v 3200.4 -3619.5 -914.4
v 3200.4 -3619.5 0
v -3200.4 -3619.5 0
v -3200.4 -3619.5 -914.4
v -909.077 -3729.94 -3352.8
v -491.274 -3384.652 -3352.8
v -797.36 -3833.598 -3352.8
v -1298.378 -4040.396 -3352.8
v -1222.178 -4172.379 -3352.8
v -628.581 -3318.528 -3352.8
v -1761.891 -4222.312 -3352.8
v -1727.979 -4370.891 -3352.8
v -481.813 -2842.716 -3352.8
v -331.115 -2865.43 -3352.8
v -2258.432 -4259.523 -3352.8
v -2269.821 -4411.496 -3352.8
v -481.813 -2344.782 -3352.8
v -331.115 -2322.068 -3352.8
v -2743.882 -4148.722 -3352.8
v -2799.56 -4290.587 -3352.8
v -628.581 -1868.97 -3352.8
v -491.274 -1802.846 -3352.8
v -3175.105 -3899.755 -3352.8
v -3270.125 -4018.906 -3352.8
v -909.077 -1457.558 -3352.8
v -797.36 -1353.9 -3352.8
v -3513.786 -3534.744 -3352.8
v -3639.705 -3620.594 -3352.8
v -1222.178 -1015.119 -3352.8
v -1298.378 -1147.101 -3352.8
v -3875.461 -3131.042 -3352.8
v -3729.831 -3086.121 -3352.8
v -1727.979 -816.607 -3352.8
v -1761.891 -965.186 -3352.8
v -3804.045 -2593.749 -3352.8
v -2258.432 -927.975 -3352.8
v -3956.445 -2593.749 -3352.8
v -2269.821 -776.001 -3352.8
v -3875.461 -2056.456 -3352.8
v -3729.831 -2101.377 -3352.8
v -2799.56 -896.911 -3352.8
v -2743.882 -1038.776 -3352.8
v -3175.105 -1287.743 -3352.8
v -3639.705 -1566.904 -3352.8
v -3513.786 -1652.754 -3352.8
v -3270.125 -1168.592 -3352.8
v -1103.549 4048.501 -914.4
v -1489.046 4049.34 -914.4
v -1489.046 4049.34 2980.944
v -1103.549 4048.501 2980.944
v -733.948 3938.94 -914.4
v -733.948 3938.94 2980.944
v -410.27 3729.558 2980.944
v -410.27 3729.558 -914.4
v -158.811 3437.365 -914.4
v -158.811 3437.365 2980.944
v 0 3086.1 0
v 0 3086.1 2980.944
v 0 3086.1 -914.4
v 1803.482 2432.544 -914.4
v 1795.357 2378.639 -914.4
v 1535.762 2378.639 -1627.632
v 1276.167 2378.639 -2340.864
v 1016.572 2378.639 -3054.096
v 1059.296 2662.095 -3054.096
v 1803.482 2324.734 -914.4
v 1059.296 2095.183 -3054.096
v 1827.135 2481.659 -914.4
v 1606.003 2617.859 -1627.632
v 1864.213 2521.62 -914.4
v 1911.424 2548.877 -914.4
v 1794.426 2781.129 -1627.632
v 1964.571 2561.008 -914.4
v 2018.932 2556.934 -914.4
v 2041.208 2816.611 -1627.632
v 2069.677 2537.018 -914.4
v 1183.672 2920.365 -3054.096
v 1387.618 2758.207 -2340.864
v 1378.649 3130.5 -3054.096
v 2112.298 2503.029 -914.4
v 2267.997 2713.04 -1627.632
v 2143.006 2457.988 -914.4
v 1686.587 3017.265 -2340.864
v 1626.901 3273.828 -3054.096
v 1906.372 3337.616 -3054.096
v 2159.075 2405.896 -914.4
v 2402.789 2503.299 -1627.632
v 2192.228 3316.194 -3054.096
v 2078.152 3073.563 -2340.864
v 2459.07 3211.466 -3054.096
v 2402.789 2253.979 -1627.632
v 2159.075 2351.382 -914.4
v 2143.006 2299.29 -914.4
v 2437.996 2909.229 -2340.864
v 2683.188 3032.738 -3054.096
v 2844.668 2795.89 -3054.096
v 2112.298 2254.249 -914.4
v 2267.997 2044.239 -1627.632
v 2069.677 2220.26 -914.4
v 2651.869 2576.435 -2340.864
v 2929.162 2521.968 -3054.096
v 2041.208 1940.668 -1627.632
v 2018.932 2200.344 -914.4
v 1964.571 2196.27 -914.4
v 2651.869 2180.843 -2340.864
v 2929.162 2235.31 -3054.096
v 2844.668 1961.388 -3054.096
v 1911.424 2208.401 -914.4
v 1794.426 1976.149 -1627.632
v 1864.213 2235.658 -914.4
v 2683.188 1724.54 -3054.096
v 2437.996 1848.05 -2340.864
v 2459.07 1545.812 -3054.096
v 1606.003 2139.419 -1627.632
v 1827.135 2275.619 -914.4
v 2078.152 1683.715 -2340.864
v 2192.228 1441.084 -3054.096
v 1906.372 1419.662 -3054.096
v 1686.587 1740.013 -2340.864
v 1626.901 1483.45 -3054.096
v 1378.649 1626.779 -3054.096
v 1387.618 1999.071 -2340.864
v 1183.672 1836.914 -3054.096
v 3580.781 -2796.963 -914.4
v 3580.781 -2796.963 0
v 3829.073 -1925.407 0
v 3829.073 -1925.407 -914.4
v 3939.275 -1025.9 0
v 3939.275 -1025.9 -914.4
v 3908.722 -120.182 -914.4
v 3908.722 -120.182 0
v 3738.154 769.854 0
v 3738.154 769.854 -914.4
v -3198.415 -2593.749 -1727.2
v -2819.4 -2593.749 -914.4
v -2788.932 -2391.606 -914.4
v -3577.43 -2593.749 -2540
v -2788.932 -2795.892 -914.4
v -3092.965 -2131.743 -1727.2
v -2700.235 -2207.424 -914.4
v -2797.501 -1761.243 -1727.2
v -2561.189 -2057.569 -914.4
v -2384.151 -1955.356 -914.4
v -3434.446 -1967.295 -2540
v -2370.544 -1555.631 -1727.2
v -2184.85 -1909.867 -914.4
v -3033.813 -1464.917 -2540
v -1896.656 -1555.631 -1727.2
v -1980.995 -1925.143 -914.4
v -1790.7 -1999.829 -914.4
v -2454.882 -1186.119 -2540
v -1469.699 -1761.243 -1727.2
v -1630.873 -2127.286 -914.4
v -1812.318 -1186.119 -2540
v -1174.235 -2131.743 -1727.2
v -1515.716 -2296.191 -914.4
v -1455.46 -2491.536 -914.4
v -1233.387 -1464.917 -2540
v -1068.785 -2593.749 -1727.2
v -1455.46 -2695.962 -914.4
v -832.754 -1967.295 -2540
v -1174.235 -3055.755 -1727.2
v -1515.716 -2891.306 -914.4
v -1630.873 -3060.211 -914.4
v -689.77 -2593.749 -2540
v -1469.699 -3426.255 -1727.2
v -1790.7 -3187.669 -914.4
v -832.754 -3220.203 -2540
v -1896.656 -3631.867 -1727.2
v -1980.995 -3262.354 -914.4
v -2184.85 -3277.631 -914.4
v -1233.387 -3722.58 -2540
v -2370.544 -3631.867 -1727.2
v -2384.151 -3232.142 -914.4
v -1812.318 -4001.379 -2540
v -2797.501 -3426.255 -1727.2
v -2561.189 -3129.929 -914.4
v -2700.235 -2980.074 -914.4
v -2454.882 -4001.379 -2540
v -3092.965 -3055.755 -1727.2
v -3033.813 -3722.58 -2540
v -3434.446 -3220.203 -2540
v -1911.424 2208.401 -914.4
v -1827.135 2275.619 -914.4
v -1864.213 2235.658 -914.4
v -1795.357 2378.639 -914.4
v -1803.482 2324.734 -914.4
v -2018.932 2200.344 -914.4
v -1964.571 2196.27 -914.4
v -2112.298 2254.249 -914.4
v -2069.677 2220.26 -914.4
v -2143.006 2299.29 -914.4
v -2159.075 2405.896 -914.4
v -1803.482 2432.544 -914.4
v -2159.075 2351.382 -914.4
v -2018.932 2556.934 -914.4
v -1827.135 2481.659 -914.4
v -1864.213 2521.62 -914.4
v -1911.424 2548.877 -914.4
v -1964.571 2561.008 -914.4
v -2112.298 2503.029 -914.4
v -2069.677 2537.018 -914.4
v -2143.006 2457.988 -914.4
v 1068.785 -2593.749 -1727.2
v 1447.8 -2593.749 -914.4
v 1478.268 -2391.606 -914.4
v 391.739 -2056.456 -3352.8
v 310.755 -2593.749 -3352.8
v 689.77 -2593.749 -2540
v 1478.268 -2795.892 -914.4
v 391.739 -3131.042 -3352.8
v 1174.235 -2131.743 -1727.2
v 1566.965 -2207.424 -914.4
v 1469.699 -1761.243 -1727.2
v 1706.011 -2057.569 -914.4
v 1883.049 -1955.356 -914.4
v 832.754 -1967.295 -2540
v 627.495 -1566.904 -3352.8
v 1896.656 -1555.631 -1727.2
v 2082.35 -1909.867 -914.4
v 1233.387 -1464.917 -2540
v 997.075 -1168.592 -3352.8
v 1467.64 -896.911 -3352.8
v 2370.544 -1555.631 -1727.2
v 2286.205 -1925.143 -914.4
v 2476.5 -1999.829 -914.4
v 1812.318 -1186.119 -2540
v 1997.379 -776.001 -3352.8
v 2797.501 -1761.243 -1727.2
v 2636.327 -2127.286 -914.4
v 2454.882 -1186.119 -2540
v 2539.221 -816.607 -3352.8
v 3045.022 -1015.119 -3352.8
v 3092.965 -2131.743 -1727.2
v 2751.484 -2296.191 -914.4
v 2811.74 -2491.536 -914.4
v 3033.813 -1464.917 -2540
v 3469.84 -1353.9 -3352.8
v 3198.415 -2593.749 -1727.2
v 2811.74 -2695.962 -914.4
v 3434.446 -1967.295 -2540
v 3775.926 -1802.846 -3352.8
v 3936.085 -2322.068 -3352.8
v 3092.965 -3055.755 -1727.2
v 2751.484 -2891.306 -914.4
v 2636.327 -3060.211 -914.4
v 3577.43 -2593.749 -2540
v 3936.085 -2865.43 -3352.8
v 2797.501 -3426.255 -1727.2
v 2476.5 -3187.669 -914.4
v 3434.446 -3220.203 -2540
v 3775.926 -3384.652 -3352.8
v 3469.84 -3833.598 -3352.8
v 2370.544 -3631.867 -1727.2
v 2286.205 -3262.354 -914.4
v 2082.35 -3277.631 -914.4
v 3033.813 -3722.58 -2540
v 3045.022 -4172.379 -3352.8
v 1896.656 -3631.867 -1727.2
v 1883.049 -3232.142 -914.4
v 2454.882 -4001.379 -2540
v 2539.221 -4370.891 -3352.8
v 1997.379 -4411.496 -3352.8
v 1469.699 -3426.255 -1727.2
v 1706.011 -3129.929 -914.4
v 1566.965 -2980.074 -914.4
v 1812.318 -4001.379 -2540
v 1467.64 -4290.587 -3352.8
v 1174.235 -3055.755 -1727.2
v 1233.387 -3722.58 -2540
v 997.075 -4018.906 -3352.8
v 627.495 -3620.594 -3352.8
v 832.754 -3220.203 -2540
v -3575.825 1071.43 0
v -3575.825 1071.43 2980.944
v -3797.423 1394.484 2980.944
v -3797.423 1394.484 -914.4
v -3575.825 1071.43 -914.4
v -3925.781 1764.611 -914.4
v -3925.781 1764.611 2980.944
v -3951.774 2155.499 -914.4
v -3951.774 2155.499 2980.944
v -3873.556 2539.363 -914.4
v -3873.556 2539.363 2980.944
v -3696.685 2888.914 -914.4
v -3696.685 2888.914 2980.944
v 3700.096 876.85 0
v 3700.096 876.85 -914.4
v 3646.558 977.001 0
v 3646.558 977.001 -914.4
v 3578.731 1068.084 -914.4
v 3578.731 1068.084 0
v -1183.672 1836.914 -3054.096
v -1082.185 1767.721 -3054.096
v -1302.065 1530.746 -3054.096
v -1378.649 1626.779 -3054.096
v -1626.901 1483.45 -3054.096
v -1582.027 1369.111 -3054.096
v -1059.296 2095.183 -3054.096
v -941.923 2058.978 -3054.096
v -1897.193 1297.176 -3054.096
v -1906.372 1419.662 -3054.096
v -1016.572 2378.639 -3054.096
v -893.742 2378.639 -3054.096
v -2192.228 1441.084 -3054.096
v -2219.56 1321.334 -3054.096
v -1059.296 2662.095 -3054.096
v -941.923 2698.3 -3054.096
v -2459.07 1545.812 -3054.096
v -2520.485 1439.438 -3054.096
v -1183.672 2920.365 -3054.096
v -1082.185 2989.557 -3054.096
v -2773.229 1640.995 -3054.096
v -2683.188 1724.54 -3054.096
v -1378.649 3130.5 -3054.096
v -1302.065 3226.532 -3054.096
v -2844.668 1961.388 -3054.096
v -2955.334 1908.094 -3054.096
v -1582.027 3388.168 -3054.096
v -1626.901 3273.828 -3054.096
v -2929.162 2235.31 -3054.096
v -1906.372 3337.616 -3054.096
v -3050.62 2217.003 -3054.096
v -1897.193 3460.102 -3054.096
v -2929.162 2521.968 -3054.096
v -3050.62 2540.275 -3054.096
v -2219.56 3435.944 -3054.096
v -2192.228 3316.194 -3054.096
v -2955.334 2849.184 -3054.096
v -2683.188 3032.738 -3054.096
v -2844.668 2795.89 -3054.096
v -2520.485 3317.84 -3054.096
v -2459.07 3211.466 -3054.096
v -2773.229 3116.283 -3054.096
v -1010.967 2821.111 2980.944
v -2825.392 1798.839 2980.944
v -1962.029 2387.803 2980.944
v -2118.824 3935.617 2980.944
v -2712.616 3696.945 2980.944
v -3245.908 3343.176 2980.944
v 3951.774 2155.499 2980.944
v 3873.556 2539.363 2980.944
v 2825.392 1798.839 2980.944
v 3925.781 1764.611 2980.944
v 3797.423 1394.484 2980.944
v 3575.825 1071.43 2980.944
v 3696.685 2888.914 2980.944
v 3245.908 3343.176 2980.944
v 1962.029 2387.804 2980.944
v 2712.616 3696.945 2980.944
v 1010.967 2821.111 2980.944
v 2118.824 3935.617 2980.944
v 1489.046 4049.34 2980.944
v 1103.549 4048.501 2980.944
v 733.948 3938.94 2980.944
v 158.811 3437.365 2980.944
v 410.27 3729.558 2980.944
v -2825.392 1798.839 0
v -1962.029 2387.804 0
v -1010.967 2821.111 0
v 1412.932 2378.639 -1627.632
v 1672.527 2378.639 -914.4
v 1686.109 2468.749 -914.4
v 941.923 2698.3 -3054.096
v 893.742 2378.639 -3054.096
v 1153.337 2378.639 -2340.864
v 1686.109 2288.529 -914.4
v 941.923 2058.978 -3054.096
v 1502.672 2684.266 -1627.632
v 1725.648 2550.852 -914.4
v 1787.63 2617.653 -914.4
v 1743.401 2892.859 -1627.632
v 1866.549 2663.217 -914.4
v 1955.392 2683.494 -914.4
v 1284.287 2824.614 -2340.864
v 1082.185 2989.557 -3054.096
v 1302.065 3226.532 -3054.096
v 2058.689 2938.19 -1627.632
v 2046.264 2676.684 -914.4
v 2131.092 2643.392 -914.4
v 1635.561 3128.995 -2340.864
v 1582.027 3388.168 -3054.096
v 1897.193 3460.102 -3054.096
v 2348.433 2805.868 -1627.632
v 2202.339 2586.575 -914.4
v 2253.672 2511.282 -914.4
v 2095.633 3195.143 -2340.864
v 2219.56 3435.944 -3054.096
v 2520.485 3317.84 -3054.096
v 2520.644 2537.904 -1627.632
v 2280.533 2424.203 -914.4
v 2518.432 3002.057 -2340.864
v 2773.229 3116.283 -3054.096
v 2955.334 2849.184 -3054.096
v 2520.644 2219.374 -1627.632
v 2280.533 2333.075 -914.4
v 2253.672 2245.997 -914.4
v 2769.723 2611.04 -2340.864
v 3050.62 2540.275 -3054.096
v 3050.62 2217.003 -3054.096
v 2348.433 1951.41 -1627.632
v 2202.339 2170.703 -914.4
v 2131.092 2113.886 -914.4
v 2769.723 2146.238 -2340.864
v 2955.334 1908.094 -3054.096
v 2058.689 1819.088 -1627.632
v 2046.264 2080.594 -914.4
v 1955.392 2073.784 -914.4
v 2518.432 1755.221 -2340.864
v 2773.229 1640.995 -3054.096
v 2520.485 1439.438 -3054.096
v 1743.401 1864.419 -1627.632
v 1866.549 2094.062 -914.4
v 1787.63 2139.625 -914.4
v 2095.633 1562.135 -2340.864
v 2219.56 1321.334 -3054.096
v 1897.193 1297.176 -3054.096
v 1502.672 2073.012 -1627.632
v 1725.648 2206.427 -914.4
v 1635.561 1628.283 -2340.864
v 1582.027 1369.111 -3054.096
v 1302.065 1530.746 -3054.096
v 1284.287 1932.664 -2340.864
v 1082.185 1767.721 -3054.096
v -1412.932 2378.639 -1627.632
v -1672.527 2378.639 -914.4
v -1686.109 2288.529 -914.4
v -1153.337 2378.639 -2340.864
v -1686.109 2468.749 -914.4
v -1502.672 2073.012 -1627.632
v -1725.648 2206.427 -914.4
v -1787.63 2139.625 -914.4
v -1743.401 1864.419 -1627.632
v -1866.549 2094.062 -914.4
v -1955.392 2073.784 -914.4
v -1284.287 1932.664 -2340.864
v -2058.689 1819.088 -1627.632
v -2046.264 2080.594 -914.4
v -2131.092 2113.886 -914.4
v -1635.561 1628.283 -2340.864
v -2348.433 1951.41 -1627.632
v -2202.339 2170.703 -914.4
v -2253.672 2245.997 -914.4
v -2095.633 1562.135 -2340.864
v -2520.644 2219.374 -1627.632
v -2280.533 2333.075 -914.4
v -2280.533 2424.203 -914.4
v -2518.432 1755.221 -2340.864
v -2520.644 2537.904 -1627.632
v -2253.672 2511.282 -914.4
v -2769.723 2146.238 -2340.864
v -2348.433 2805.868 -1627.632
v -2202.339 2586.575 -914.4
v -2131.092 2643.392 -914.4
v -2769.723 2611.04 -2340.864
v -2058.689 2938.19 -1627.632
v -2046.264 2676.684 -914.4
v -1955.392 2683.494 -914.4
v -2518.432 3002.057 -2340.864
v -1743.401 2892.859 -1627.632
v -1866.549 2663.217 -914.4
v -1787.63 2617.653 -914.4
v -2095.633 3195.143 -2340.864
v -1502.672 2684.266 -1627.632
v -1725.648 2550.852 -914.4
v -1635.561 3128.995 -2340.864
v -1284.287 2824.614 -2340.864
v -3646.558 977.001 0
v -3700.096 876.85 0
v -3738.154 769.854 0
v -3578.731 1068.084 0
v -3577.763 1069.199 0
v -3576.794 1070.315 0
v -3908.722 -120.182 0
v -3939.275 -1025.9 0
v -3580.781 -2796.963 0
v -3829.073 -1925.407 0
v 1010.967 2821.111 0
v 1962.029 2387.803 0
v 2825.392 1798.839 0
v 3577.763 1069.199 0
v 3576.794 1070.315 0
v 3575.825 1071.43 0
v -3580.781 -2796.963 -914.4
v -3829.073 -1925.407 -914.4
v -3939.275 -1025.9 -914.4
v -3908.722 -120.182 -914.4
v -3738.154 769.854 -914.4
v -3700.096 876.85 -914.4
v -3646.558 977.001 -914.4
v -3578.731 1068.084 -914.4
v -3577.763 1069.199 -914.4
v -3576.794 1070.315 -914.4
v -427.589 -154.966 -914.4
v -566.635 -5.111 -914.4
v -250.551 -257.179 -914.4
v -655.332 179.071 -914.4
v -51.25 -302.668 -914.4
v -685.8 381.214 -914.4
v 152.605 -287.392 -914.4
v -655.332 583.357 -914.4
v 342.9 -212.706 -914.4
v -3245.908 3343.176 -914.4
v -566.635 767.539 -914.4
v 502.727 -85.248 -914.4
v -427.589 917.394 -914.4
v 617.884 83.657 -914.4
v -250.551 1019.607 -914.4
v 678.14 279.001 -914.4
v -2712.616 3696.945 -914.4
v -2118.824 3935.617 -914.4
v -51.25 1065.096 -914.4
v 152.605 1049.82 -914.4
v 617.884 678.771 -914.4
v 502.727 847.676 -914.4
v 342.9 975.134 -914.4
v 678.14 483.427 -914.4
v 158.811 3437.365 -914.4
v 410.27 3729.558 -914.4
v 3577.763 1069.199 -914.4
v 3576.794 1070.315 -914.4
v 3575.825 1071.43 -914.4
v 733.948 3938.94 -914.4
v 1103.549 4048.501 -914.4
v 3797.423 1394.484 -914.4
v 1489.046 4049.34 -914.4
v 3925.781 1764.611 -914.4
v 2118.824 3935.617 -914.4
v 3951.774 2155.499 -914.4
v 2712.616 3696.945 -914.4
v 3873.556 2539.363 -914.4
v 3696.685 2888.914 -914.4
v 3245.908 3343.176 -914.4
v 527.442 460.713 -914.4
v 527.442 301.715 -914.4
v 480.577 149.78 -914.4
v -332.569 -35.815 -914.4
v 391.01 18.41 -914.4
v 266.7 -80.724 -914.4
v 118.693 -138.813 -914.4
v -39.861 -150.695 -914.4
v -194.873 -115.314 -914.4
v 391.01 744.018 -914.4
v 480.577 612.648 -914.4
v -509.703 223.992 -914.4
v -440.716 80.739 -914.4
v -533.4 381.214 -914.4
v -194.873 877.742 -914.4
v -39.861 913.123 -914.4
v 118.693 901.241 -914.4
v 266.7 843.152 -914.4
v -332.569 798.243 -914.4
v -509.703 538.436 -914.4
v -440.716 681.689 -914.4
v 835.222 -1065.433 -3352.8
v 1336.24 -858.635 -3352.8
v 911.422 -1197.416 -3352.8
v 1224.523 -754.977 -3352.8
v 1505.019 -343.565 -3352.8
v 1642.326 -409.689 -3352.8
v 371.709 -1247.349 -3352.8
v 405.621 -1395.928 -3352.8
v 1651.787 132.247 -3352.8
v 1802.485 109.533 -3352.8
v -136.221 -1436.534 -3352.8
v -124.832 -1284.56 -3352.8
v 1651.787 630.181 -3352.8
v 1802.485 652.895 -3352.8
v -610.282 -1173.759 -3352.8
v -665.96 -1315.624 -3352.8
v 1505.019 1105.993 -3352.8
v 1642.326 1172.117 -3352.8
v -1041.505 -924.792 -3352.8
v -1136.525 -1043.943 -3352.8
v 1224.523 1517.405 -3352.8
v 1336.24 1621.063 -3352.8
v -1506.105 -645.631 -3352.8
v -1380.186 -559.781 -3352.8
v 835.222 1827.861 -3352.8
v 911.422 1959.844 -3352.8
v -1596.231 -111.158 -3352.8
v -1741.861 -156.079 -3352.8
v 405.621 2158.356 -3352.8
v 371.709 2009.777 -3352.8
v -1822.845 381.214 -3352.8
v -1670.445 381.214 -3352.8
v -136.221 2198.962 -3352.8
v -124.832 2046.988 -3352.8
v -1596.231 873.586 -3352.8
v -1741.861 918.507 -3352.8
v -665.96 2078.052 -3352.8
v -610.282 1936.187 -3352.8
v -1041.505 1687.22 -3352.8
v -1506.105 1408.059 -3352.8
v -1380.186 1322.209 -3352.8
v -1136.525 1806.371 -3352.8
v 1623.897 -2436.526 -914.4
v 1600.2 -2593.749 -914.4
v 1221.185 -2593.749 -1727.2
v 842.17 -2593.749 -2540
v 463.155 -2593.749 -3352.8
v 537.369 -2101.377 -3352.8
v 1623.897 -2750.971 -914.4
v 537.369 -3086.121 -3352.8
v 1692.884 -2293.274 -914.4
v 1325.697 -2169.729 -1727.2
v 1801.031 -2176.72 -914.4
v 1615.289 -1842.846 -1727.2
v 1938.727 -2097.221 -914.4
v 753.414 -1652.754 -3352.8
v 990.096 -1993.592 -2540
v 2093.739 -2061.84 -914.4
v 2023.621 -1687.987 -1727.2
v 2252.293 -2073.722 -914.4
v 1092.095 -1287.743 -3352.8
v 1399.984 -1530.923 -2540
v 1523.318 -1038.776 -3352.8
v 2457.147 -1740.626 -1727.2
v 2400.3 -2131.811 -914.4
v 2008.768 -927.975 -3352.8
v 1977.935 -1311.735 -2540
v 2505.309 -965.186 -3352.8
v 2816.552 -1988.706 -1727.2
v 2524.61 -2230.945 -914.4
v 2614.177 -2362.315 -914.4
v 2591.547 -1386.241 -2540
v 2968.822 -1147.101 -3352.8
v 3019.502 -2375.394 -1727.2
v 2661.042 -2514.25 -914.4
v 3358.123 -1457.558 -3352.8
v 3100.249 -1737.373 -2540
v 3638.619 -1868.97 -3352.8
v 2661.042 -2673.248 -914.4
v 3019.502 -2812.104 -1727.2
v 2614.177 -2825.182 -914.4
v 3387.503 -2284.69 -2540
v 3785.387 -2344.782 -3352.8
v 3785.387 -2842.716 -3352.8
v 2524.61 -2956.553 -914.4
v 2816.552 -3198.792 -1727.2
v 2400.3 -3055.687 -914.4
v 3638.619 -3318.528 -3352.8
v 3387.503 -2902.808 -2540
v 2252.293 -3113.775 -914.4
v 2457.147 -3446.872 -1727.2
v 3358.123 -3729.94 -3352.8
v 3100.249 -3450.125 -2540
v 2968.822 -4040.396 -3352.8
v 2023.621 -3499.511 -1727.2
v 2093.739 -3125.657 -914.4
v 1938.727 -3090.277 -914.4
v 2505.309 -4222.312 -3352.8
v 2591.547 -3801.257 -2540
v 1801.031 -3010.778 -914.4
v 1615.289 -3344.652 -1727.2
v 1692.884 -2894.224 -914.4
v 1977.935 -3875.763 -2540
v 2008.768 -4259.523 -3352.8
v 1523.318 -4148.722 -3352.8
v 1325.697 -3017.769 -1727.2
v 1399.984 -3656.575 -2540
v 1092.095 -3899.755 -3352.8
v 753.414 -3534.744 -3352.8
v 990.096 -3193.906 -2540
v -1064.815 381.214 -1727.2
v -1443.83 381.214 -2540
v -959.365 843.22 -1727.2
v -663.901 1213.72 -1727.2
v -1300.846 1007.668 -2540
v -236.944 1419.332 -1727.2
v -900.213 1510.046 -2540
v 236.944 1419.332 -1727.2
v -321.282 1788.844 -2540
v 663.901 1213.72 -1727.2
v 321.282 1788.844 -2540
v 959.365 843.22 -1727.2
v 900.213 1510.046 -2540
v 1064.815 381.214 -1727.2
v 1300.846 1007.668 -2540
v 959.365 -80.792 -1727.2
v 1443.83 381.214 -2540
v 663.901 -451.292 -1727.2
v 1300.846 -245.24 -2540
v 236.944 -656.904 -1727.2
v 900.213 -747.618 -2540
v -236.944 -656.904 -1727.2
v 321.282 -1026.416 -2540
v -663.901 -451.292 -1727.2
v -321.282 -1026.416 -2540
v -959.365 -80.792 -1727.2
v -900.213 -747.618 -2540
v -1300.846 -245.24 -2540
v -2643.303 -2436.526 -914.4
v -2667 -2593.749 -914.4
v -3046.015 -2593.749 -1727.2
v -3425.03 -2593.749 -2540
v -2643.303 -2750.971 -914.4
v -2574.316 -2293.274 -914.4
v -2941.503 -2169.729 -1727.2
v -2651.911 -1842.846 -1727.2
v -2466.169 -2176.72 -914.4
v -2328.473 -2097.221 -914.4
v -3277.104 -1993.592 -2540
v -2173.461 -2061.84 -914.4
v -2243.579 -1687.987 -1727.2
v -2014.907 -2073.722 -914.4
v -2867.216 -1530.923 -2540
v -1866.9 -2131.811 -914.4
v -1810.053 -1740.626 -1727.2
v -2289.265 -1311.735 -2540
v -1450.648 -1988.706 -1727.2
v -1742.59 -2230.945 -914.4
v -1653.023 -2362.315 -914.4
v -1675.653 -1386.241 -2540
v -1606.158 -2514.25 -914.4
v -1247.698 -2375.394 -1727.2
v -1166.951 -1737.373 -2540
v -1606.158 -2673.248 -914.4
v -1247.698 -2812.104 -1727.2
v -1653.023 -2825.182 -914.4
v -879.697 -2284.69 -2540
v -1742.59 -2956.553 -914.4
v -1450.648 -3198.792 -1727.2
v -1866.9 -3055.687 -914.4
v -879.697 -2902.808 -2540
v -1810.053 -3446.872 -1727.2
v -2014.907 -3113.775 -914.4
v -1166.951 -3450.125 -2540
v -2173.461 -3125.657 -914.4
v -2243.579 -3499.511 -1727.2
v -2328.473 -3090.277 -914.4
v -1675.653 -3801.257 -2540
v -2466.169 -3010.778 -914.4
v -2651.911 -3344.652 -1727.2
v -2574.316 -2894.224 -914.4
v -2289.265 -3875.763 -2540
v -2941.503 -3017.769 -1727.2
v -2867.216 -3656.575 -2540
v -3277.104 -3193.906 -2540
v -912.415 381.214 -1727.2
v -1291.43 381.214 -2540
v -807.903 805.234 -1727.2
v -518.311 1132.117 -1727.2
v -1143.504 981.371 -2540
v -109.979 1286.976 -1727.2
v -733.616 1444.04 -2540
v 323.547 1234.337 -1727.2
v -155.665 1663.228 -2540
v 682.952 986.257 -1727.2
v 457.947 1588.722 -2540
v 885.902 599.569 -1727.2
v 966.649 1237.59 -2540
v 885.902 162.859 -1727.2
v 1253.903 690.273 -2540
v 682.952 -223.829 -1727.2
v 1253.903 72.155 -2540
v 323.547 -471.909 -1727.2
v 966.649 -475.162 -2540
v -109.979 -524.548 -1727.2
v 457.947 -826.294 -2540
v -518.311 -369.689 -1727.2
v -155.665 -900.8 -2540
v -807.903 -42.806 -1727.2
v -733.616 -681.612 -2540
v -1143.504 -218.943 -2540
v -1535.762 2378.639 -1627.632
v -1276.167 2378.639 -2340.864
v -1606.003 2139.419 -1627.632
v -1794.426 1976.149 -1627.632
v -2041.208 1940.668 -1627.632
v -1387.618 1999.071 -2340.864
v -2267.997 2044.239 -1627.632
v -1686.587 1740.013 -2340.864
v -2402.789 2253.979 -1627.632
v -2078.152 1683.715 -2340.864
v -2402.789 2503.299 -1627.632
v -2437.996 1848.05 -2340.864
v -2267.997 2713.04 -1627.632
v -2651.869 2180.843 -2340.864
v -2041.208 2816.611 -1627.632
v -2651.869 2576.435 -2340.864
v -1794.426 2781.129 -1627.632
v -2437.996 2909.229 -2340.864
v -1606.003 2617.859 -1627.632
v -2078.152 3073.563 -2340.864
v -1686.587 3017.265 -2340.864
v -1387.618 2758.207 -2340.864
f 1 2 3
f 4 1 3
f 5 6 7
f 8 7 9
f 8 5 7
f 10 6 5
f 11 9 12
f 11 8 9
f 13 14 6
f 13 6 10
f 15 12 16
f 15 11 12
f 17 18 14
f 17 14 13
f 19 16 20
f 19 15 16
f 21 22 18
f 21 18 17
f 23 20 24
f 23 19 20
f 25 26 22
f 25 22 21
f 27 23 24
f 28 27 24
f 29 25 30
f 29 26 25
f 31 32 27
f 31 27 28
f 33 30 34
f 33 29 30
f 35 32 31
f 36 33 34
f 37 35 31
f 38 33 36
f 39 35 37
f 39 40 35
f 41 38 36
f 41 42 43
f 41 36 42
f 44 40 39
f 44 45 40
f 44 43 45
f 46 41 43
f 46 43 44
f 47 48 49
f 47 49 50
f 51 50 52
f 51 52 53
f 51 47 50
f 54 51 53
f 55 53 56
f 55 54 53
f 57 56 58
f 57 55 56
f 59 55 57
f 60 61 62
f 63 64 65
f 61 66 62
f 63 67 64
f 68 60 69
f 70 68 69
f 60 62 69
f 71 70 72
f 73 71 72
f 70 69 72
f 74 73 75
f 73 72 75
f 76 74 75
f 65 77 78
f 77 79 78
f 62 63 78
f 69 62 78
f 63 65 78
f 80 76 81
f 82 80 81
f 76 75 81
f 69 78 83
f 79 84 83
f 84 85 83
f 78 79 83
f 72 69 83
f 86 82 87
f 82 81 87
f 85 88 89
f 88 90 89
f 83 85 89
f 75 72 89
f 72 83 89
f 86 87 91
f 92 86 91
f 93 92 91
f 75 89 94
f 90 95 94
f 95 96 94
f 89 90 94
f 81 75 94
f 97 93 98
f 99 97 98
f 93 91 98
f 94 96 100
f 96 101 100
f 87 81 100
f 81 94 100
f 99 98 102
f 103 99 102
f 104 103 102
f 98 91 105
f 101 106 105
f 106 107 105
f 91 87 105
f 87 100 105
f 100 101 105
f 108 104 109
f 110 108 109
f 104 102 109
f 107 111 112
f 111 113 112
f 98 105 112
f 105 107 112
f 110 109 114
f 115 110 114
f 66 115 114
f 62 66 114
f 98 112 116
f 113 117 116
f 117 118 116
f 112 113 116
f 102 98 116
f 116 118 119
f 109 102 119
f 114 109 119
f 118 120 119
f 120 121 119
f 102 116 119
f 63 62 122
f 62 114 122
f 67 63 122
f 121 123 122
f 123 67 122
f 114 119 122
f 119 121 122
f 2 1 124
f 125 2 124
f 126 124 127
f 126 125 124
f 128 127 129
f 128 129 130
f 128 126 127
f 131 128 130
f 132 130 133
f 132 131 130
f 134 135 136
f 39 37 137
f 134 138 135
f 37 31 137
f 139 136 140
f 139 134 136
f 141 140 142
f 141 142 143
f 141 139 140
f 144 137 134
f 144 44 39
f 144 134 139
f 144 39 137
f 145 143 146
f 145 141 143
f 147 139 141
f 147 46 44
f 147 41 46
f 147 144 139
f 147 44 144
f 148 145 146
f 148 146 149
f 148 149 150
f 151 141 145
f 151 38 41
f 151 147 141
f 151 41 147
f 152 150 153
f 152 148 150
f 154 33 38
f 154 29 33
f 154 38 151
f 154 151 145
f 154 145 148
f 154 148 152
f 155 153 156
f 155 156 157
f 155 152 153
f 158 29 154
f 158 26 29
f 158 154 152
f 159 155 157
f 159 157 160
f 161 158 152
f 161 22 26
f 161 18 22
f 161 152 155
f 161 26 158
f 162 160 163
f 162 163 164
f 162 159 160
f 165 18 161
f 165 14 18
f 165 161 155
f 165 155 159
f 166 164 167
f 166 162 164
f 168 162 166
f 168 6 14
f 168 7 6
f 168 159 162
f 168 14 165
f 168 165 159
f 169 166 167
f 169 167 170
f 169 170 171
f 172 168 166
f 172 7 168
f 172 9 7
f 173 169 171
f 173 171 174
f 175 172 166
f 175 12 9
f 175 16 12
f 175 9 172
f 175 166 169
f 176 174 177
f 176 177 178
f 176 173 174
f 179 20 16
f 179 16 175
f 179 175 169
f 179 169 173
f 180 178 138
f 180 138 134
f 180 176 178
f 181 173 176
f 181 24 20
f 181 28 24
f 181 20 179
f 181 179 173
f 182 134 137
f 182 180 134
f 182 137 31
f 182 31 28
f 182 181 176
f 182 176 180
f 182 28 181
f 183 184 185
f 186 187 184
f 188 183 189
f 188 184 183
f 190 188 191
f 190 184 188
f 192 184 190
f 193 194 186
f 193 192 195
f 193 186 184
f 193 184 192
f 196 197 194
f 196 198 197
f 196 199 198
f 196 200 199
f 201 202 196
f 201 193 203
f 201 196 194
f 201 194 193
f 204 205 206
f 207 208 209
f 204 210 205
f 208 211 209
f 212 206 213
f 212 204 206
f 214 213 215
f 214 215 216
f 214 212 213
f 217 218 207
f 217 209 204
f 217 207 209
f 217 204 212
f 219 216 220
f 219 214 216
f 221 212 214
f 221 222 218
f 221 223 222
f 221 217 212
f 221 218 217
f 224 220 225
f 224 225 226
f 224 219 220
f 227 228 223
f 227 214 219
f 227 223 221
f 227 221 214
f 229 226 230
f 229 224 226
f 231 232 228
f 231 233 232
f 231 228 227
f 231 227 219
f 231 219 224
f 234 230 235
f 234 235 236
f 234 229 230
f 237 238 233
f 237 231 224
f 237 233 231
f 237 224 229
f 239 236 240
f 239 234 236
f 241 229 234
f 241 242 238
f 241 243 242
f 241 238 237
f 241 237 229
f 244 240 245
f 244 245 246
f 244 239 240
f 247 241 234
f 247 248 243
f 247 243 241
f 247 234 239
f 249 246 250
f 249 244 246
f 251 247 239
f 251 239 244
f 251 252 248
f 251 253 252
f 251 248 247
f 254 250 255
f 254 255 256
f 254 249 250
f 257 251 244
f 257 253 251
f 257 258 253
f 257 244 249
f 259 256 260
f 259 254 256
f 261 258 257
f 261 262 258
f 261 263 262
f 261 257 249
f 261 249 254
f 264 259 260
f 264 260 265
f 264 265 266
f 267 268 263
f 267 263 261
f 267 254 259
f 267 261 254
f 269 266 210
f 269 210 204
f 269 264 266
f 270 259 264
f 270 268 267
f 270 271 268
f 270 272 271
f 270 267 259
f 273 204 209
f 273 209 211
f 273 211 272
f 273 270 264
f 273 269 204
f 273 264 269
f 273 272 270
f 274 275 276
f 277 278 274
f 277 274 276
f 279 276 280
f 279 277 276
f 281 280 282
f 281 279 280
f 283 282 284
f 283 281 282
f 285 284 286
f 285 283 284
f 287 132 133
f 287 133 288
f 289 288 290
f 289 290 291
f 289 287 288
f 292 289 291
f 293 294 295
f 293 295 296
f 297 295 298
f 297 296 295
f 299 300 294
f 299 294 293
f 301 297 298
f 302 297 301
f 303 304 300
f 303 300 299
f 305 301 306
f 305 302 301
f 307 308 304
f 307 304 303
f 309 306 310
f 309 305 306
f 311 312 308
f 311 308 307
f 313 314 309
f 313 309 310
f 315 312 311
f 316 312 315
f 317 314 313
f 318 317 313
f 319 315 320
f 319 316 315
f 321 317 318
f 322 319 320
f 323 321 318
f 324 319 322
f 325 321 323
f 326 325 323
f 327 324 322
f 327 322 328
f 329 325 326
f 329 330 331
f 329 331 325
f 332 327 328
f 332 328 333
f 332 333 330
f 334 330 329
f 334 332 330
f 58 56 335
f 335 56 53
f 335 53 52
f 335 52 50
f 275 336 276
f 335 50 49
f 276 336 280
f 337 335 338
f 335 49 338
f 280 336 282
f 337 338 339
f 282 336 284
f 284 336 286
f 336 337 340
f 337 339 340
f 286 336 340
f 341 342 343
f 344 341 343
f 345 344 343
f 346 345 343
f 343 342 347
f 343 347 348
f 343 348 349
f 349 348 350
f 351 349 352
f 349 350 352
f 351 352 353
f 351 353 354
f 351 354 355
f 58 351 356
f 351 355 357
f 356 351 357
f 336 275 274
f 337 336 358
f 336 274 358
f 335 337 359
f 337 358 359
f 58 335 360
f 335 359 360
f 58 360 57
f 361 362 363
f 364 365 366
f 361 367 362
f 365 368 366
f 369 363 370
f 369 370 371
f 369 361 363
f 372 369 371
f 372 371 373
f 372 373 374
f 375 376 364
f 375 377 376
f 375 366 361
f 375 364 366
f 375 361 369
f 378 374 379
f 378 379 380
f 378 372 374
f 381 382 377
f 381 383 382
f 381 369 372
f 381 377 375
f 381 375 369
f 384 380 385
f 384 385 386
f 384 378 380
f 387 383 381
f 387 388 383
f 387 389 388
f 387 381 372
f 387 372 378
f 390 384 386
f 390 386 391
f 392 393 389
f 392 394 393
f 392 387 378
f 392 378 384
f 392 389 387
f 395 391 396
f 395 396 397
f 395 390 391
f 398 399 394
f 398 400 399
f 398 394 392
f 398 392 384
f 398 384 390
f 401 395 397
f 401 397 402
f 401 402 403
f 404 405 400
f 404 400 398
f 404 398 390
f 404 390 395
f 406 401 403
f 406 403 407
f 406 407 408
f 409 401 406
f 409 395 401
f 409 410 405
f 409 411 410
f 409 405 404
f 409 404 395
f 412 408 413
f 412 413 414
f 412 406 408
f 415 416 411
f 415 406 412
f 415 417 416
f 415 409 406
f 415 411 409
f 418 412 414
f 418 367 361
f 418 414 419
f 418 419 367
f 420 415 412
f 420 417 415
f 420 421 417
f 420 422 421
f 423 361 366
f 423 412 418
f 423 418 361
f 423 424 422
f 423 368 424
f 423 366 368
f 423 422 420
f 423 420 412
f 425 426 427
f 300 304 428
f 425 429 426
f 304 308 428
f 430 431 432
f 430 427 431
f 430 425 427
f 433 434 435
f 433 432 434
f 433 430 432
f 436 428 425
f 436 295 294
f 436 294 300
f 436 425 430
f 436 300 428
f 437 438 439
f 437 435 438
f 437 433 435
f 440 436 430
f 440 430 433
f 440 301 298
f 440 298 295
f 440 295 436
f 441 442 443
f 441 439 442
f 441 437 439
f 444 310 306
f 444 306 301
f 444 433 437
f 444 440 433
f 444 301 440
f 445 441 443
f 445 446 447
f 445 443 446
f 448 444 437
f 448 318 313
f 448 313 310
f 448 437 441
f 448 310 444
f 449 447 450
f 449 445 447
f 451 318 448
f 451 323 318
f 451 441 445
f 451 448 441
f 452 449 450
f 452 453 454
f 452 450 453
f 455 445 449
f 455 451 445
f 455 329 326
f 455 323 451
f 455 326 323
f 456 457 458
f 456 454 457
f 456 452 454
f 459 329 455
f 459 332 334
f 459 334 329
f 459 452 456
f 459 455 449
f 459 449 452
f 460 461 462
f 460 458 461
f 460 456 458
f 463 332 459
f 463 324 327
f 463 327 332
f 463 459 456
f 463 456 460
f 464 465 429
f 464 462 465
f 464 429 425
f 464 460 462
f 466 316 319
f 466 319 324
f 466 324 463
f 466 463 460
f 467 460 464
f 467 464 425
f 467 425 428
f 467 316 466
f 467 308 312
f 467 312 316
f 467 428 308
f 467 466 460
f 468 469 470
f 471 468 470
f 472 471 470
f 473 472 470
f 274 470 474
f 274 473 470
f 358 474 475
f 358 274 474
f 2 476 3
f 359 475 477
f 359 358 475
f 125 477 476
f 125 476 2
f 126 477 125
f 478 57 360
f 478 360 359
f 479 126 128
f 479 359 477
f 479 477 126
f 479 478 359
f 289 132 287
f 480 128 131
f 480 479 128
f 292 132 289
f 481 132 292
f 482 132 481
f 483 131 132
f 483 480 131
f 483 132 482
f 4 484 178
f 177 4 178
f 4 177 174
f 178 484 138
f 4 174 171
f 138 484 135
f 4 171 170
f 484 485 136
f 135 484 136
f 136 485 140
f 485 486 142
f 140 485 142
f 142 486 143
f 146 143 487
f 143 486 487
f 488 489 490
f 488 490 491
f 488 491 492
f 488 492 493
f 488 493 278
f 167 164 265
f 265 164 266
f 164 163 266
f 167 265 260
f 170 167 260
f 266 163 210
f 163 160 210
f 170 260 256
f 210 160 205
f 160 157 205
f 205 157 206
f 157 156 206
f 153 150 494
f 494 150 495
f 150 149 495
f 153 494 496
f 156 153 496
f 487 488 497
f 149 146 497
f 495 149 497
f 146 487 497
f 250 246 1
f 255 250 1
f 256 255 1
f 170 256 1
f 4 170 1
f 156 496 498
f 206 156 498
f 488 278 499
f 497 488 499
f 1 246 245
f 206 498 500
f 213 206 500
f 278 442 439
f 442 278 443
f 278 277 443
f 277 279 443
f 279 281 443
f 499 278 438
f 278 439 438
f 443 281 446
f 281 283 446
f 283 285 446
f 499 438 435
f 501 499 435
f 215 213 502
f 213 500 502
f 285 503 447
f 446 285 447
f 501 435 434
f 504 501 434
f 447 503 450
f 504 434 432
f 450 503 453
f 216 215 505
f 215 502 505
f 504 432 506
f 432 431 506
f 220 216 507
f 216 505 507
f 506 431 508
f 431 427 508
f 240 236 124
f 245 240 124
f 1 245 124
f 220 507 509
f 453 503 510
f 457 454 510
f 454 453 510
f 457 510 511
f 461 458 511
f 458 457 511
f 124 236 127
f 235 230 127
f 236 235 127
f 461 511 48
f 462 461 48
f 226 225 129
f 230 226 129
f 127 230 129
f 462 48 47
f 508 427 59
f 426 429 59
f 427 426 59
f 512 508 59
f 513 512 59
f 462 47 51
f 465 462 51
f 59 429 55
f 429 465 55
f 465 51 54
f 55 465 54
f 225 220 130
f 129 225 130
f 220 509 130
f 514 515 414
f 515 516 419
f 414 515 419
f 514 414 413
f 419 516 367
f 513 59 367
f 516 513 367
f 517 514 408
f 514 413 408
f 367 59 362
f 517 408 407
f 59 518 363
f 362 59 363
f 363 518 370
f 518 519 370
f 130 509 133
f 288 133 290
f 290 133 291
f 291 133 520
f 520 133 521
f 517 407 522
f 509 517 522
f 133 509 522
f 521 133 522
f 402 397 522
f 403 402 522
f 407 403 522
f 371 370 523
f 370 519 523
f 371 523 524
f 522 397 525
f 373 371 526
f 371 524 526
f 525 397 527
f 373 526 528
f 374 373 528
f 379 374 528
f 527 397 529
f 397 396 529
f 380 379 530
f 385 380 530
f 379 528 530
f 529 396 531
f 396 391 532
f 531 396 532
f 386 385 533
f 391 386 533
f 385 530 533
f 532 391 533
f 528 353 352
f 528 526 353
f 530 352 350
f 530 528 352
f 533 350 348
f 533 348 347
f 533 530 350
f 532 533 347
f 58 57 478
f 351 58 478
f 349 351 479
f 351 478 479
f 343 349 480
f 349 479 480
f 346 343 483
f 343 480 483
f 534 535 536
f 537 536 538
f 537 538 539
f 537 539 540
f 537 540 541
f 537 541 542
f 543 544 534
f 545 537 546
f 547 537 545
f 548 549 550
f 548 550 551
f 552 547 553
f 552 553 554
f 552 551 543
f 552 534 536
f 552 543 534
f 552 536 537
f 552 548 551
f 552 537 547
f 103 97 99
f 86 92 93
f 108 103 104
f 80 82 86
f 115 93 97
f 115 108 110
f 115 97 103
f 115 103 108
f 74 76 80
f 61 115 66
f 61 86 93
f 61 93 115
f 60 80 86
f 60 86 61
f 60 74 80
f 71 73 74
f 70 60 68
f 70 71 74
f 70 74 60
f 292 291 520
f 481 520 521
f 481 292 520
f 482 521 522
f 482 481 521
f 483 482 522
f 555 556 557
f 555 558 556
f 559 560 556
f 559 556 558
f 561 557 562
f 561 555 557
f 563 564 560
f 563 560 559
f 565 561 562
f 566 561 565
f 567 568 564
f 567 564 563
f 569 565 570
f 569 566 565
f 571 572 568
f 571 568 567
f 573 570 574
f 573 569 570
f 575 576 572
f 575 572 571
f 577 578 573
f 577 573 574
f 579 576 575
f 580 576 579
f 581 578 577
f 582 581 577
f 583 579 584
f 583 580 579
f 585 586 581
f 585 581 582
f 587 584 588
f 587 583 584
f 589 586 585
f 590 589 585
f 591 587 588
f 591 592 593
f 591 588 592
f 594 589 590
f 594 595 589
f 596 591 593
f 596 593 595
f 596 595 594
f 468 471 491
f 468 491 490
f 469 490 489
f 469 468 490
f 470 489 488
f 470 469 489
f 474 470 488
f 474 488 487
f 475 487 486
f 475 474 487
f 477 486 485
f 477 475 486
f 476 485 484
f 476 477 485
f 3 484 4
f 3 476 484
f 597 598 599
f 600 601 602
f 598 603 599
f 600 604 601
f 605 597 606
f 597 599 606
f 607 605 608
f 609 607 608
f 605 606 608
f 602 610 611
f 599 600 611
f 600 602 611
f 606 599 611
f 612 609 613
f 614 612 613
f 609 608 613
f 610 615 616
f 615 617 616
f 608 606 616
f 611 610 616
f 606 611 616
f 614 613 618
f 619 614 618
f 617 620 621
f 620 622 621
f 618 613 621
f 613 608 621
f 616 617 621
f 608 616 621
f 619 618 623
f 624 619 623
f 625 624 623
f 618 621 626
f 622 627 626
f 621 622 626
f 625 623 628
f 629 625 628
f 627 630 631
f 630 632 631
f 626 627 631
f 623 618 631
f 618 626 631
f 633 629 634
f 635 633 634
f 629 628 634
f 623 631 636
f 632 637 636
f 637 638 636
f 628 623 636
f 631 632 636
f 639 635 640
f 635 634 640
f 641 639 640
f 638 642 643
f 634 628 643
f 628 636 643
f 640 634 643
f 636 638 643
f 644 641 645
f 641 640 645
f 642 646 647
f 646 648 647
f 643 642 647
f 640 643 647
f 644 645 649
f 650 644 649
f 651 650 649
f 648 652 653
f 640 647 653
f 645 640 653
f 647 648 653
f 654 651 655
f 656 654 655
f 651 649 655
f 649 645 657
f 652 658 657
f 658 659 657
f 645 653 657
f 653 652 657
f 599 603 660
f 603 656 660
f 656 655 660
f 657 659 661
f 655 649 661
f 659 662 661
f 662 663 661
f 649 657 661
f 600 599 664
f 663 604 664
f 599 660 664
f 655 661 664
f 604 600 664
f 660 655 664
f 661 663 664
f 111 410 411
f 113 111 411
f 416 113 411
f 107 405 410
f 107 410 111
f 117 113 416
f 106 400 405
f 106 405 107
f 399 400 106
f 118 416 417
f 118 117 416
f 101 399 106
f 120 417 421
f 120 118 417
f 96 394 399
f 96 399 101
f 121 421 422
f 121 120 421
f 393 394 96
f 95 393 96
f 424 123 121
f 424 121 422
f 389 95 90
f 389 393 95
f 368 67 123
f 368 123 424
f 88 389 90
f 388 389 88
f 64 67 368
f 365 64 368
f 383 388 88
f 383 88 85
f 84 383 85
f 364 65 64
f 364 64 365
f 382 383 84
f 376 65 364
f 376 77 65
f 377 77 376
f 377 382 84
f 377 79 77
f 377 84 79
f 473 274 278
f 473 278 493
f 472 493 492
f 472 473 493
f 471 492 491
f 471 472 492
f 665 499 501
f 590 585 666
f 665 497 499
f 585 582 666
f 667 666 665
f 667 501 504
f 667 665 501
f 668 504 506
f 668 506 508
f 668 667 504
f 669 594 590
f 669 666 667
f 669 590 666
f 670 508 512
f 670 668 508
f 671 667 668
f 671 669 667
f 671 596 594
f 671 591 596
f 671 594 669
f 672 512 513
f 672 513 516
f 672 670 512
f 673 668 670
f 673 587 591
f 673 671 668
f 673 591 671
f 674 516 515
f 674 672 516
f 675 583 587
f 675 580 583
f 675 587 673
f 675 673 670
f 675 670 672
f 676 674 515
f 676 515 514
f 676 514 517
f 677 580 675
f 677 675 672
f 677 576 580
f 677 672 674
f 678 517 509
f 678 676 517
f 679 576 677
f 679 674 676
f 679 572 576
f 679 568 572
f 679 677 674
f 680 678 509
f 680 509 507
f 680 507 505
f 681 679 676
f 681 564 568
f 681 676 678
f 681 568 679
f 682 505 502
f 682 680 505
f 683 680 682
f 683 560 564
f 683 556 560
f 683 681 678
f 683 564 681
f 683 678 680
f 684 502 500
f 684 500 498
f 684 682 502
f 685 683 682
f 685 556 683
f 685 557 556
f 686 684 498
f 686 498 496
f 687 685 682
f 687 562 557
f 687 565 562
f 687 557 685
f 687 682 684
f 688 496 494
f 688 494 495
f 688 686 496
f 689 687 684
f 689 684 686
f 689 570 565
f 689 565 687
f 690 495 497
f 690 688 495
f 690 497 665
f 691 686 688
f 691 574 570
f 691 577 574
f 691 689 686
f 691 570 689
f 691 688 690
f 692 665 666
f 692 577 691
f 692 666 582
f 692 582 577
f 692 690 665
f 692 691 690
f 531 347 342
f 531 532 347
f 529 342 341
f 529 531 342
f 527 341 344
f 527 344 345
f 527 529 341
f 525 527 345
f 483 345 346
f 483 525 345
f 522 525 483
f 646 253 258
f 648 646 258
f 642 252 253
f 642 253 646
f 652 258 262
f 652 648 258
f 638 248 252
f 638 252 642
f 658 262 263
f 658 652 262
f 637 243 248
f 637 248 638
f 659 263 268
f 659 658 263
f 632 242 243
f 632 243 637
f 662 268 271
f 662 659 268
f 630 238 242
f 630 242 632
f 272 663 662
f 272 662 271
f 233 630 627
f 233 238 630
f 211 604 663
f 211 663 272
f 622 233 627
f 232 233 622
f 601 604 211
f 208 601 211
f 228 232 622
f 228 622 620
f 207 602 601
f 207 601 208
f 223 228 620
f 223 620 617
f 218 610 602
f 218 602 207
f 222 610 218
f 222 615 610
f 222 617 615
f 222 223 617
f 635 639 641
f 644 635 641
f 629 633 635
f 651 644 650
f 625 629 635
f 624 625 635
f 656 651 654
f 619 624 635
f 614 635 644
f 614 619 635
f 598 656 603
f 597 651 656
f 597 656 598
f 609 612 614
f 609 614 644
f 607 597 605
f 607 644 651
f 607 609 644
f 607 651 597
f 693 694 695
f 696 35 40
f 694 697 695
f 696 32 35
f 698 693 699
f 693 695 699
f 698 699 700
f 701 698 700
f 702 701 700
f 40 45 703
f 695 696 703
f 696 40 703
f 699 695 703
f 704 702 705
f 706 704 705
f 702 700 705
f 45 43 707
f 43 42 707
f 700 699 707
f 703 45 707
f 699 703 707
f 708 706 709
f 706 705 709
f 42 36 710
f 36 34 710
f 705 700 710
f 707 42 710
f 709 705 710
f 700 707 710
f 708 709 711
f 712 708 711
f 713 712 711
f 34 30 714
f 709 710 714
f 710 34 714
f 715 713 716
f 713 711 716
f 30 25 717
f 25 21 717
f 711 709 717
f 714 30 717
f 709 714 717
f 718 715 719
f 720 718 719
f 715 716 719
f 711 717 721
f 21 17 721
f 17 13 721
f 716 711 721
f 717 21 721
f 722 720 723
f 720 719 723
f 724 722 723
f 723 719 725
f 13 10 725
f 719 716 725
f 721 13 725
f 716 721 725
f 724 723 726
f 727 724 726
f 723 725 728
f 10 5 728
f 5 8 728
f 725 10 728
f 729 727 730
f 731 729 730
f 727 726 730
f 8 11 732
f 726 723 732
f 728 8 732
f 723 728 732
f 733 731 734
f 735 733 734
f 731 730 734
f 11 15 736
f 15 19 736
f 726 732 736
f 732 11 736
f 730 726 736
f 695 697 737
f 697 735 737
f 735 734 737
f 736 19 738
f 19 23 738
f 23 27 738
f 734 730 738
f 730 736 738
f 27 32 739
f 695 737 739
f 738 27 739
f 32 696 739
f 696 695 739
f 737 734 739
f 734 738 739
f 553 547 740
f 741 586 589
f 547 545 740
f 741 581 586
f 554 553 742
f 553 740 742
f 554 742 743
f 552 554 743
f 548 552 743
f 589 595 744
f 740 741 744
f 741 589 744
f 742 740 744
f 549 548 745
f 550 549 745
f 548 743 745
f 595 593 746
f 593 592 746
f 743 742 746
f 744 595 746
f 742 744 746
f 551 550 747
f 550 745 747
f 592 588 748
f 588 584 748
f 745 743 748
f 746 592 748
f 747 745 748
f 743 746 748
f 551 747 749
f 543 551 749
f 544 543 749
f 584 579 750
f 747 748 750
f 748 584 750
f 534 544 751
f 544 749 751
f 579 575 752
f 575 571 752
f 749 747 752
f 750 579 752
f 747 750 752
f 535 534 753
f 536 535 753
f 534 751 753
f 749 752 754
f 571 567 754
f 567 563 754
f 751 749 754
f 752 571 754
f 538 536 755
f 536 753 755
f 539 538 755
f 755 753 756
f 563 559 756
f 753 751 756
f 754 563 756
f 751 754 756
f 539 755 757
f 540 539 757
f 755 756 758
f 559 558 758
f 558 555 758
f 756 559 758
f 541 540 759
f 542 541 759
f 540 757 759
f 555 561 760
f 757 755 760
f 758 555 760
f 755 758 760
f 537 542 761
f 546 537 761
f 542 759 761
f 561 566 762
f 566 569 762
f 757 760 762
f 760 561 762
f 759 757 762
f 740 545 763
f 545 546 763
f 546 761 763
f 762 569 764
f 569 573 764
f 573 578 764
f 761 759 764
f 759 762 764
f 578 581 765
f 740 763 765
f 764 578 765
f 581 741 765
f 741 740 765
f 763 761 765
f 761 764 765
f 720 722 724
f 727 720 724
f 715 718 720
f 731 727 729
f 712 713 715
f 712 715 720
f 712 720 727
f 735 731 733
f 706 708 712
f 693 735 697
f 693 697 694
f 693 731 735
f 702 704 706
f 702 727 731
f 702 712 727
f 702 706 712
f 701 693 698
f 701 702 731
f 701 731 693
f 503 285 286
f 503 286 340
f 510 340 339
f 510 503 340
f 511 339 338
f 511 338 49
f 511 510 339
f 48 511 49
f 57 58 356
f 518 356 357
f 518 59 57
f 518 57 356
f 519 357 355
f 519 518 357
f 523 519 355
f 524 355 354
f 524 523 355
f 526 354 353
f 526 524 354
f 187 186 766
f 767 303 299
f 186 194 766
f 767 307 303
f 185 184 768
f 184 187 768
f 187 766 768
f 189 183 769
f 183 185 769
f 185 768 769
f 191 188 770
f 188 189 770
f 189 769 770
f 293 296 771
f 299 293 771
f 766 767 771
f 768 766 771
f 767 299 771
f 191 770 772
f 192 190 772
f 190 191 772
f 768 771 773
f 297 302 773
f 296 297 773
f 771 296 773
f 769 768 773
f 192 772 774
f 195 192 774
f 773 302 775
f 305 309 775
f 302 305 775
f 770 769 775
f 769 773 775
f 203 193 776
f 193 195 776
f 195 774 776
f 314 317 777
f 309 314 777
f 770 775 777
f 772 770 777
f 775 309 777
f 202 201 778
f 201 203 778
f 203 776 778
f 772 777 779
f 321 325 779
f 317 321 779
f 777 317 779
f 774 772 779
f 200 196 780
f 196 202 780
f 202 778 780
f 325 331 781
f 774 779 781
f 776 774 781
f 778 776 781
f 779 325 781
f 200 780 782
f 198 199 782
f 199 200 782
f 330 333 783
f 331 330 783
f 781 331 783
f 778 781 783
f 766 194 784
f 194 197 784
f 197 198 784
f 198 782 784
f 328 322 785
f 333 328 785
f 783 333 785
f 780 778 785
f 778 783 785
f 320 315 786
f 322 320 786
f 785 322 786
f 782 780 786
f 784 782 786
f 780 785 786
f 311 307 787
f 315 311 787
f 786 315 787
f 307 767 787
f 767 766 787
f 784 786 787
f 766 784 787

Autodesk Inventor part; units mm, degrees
ref_plane "YZ Plane" through (0, 0, 0) normal (1, 0, 0) x (0, 1, 0)
ref_plane "XZ Plane" through (0, 0, 0) normal (0, 1, 0) x (-1, 0, 0)
ref_plane "XY Plane" through (0, 0, 0) normal (0, 0, 1) x (1, 0, 0)
sketch "Sketch3" plane through (0, 0, 0) normal (0, 0, 1) x (1, 0, 0)
  line L0 (3200.4, -3619.5) -> (-3200.4, -3619.5)
  line L1 (0, -3619.5) -> (0, 3086.1) construction
  arc A0 (-3738.1541, 769.8538) -> (-3200.4, -3619.5) centre (1884.0877, -768.9648) ccw
  arc A1 (0, 3086.1) -> (-3578.7308, 1068.0837) centre (1038.9488, -2938.6136) ccw
  arc A2 (-3578.7308, 1068.0837) -> (-3738.1541, 769.8538) centre (-3003.1863, 568.6916) ccw
  arc A3 (3200.4, -3619.5) -> (3738.1541, 769.8538) centre (-1884.0877, -768.9648) ccw
  arc A4 (3578.7308, 1068.0837) -> (0, 3086.1) centre (-1038.9488, -2938.6136) ccw
  arc A5 (3738.1541, 769.8538) -> (3578.7308, 1068.0837) centre (3003.1863, 568.6916) ccw
  arc A6 (-3278.4432, 715.8952) -> (-2925.1203, -3162.3) centre (1884.0877, -768.9648) ccw
  line L2 (-2925.1203, -3162.3) -> (2925.1203, -3162.3)
  arc A7 (2925.1203, -3162.3) -> (3278.4432, 715.8952) centre (-1884.0877, -768.9648) ccw
  arc A8 (3278.4432, 715.8952) -> (0, 2621.5927) centre (-1038.9488, -2938.6136) ccw
  arc A9 (0, 2621.5927) -> (-3278.4432, 715.8952) centre (1038.9488, -2938.6136) ccw
  dimension "d3" = 6400.8
  dimension "d4" = 6705.6
  dimension "d5" = 762
  dimension "d6" = 457.2
extrude "Extrusion9" add sketch "Sketch3" against normal blind 914.4 contours L0 A0 A2 A1 A4 A5 A3 | A9 A8 A7 L2 A6
sketch "Sketch14" plane through (0, 0, -914.4) normal (0, 0, -1) x (-1, 0, 0)
  line L0 (0, 3086.1) -> (0, -4176.5904) construction
  arc A0 (-3696.6852, 2888.9142) -> (-3575.8252, 1071.43) centre (-2485.7718, 2056.6775) ccw
  arc A1 (0, 3086.1) -> (-1489.0459, 4049.3399) centre (-1299.2098, 2710.2449) ccw
  arc A2 (-1489.0459, 4049.3399) -> (-3696.6852, 2888.9142) centre (-1247.1211, 908.9303) ccw
  arc A3 (3575.8252, 1071.43) -> (3696.6852, 2888.9142) centre (2485.7718, 2056.6775) ccw
  arc A4 (1489.0459, 4049.3399) -> (0, 3086.1) centre (1299.2098, 2710.2449) ccw
  arc A5 (3696.6852, 2888.9142) -> (1489.0459, 4049.3399) centre (1247.1211, 908.9303) ccw
  arc A6 (3578.7308, 1068.0837) -> (0, 3086.1) centre (-1038.9488, -2938.6136) ccw projected
  arc A7 (3578.7308, 1068.0837) -> (0, 3086.1) centre (-1038.9488, -2938.6136) ccw
  arc A8 (0, 3086.1) -> (-3578.7308, 1068.0837) centre (1038.9488, -2938.6136) ccw projected
  arc A9 (-3578.7308, 1068.0837) -> (-3738.1541, 769.8538) centre (-3003.1863, 568.6916) ccw projected
  arc A10 (0, 3086.1) -> (-3578.7308, 1068.0837) centre (1038.9488, -2938.6136) ccw
extrude "Extrusion11" add sketch "Sketch14" against normal blind 3895.344
sketch "Sketch15" plane through (0, 0, -914.4) normal (0, 0, -1) x (-1, 0, 0)
  circle A0 centre (-1978.2373, 2378.6391) radius 305.71
  circle A1 centre (-1978.2373, 2378.6391) radius 182.88
  point P0 (0, 0)
  dimension "d61" = 611.42
  dimension "d63" = 365.76
extrude "Extrusion12" add sketch "Sketch15" along normal blind 2139.696 draft 20 contours A0 | A1
extrude "Extrusion13" cut sketch "Sketch15" along normal blind 2139.696 draft 20 contours A1
mirror "Mirror2" about plane through (0, 0, 0) normal (1, 0, 0) of "Extrusion12", "Extrusion13"
sketch "Sketch17" plane through (0, 0, -914.4) normal (0, 0, -1) x (-1, 0, 0)
  circle A0 centre (0, 381.214) radius 685.8
  circle A1 centre (-2133.6, -2593.7489) radius 685.8
  circle A2 centre (2133.6, -2593.7489) radius 685.8
  circle A3 centre (0, 381.214) radius 533.4
  circle A4 centre (2133.6, -2593.7489) radius 533.4
  circle A5 centre (-2133.6, -2593.7489) radius 533.4
  point P0 (0, 0)
  dimension "d74" = 1371.6
  dimension "d75" = 1371.6
  dimension "d76" = 1371.6
  dimension "d79" = 1066.8
  dimension "d80" = 1066.8
  dimension "d81" = 1066.8
extrude "Extrusion14" add sketch "Sketch17" along normal blind 2438.4 draft 25 contours A0 | A1 | A2 | A3 | A4 | A5
extrude "Extrusion15" cut sketch "Sketch17" along normal blind 2438.4 draft 25 contours A3 | A4 | A5
properties part number "engines" material "Steel, Mild"
